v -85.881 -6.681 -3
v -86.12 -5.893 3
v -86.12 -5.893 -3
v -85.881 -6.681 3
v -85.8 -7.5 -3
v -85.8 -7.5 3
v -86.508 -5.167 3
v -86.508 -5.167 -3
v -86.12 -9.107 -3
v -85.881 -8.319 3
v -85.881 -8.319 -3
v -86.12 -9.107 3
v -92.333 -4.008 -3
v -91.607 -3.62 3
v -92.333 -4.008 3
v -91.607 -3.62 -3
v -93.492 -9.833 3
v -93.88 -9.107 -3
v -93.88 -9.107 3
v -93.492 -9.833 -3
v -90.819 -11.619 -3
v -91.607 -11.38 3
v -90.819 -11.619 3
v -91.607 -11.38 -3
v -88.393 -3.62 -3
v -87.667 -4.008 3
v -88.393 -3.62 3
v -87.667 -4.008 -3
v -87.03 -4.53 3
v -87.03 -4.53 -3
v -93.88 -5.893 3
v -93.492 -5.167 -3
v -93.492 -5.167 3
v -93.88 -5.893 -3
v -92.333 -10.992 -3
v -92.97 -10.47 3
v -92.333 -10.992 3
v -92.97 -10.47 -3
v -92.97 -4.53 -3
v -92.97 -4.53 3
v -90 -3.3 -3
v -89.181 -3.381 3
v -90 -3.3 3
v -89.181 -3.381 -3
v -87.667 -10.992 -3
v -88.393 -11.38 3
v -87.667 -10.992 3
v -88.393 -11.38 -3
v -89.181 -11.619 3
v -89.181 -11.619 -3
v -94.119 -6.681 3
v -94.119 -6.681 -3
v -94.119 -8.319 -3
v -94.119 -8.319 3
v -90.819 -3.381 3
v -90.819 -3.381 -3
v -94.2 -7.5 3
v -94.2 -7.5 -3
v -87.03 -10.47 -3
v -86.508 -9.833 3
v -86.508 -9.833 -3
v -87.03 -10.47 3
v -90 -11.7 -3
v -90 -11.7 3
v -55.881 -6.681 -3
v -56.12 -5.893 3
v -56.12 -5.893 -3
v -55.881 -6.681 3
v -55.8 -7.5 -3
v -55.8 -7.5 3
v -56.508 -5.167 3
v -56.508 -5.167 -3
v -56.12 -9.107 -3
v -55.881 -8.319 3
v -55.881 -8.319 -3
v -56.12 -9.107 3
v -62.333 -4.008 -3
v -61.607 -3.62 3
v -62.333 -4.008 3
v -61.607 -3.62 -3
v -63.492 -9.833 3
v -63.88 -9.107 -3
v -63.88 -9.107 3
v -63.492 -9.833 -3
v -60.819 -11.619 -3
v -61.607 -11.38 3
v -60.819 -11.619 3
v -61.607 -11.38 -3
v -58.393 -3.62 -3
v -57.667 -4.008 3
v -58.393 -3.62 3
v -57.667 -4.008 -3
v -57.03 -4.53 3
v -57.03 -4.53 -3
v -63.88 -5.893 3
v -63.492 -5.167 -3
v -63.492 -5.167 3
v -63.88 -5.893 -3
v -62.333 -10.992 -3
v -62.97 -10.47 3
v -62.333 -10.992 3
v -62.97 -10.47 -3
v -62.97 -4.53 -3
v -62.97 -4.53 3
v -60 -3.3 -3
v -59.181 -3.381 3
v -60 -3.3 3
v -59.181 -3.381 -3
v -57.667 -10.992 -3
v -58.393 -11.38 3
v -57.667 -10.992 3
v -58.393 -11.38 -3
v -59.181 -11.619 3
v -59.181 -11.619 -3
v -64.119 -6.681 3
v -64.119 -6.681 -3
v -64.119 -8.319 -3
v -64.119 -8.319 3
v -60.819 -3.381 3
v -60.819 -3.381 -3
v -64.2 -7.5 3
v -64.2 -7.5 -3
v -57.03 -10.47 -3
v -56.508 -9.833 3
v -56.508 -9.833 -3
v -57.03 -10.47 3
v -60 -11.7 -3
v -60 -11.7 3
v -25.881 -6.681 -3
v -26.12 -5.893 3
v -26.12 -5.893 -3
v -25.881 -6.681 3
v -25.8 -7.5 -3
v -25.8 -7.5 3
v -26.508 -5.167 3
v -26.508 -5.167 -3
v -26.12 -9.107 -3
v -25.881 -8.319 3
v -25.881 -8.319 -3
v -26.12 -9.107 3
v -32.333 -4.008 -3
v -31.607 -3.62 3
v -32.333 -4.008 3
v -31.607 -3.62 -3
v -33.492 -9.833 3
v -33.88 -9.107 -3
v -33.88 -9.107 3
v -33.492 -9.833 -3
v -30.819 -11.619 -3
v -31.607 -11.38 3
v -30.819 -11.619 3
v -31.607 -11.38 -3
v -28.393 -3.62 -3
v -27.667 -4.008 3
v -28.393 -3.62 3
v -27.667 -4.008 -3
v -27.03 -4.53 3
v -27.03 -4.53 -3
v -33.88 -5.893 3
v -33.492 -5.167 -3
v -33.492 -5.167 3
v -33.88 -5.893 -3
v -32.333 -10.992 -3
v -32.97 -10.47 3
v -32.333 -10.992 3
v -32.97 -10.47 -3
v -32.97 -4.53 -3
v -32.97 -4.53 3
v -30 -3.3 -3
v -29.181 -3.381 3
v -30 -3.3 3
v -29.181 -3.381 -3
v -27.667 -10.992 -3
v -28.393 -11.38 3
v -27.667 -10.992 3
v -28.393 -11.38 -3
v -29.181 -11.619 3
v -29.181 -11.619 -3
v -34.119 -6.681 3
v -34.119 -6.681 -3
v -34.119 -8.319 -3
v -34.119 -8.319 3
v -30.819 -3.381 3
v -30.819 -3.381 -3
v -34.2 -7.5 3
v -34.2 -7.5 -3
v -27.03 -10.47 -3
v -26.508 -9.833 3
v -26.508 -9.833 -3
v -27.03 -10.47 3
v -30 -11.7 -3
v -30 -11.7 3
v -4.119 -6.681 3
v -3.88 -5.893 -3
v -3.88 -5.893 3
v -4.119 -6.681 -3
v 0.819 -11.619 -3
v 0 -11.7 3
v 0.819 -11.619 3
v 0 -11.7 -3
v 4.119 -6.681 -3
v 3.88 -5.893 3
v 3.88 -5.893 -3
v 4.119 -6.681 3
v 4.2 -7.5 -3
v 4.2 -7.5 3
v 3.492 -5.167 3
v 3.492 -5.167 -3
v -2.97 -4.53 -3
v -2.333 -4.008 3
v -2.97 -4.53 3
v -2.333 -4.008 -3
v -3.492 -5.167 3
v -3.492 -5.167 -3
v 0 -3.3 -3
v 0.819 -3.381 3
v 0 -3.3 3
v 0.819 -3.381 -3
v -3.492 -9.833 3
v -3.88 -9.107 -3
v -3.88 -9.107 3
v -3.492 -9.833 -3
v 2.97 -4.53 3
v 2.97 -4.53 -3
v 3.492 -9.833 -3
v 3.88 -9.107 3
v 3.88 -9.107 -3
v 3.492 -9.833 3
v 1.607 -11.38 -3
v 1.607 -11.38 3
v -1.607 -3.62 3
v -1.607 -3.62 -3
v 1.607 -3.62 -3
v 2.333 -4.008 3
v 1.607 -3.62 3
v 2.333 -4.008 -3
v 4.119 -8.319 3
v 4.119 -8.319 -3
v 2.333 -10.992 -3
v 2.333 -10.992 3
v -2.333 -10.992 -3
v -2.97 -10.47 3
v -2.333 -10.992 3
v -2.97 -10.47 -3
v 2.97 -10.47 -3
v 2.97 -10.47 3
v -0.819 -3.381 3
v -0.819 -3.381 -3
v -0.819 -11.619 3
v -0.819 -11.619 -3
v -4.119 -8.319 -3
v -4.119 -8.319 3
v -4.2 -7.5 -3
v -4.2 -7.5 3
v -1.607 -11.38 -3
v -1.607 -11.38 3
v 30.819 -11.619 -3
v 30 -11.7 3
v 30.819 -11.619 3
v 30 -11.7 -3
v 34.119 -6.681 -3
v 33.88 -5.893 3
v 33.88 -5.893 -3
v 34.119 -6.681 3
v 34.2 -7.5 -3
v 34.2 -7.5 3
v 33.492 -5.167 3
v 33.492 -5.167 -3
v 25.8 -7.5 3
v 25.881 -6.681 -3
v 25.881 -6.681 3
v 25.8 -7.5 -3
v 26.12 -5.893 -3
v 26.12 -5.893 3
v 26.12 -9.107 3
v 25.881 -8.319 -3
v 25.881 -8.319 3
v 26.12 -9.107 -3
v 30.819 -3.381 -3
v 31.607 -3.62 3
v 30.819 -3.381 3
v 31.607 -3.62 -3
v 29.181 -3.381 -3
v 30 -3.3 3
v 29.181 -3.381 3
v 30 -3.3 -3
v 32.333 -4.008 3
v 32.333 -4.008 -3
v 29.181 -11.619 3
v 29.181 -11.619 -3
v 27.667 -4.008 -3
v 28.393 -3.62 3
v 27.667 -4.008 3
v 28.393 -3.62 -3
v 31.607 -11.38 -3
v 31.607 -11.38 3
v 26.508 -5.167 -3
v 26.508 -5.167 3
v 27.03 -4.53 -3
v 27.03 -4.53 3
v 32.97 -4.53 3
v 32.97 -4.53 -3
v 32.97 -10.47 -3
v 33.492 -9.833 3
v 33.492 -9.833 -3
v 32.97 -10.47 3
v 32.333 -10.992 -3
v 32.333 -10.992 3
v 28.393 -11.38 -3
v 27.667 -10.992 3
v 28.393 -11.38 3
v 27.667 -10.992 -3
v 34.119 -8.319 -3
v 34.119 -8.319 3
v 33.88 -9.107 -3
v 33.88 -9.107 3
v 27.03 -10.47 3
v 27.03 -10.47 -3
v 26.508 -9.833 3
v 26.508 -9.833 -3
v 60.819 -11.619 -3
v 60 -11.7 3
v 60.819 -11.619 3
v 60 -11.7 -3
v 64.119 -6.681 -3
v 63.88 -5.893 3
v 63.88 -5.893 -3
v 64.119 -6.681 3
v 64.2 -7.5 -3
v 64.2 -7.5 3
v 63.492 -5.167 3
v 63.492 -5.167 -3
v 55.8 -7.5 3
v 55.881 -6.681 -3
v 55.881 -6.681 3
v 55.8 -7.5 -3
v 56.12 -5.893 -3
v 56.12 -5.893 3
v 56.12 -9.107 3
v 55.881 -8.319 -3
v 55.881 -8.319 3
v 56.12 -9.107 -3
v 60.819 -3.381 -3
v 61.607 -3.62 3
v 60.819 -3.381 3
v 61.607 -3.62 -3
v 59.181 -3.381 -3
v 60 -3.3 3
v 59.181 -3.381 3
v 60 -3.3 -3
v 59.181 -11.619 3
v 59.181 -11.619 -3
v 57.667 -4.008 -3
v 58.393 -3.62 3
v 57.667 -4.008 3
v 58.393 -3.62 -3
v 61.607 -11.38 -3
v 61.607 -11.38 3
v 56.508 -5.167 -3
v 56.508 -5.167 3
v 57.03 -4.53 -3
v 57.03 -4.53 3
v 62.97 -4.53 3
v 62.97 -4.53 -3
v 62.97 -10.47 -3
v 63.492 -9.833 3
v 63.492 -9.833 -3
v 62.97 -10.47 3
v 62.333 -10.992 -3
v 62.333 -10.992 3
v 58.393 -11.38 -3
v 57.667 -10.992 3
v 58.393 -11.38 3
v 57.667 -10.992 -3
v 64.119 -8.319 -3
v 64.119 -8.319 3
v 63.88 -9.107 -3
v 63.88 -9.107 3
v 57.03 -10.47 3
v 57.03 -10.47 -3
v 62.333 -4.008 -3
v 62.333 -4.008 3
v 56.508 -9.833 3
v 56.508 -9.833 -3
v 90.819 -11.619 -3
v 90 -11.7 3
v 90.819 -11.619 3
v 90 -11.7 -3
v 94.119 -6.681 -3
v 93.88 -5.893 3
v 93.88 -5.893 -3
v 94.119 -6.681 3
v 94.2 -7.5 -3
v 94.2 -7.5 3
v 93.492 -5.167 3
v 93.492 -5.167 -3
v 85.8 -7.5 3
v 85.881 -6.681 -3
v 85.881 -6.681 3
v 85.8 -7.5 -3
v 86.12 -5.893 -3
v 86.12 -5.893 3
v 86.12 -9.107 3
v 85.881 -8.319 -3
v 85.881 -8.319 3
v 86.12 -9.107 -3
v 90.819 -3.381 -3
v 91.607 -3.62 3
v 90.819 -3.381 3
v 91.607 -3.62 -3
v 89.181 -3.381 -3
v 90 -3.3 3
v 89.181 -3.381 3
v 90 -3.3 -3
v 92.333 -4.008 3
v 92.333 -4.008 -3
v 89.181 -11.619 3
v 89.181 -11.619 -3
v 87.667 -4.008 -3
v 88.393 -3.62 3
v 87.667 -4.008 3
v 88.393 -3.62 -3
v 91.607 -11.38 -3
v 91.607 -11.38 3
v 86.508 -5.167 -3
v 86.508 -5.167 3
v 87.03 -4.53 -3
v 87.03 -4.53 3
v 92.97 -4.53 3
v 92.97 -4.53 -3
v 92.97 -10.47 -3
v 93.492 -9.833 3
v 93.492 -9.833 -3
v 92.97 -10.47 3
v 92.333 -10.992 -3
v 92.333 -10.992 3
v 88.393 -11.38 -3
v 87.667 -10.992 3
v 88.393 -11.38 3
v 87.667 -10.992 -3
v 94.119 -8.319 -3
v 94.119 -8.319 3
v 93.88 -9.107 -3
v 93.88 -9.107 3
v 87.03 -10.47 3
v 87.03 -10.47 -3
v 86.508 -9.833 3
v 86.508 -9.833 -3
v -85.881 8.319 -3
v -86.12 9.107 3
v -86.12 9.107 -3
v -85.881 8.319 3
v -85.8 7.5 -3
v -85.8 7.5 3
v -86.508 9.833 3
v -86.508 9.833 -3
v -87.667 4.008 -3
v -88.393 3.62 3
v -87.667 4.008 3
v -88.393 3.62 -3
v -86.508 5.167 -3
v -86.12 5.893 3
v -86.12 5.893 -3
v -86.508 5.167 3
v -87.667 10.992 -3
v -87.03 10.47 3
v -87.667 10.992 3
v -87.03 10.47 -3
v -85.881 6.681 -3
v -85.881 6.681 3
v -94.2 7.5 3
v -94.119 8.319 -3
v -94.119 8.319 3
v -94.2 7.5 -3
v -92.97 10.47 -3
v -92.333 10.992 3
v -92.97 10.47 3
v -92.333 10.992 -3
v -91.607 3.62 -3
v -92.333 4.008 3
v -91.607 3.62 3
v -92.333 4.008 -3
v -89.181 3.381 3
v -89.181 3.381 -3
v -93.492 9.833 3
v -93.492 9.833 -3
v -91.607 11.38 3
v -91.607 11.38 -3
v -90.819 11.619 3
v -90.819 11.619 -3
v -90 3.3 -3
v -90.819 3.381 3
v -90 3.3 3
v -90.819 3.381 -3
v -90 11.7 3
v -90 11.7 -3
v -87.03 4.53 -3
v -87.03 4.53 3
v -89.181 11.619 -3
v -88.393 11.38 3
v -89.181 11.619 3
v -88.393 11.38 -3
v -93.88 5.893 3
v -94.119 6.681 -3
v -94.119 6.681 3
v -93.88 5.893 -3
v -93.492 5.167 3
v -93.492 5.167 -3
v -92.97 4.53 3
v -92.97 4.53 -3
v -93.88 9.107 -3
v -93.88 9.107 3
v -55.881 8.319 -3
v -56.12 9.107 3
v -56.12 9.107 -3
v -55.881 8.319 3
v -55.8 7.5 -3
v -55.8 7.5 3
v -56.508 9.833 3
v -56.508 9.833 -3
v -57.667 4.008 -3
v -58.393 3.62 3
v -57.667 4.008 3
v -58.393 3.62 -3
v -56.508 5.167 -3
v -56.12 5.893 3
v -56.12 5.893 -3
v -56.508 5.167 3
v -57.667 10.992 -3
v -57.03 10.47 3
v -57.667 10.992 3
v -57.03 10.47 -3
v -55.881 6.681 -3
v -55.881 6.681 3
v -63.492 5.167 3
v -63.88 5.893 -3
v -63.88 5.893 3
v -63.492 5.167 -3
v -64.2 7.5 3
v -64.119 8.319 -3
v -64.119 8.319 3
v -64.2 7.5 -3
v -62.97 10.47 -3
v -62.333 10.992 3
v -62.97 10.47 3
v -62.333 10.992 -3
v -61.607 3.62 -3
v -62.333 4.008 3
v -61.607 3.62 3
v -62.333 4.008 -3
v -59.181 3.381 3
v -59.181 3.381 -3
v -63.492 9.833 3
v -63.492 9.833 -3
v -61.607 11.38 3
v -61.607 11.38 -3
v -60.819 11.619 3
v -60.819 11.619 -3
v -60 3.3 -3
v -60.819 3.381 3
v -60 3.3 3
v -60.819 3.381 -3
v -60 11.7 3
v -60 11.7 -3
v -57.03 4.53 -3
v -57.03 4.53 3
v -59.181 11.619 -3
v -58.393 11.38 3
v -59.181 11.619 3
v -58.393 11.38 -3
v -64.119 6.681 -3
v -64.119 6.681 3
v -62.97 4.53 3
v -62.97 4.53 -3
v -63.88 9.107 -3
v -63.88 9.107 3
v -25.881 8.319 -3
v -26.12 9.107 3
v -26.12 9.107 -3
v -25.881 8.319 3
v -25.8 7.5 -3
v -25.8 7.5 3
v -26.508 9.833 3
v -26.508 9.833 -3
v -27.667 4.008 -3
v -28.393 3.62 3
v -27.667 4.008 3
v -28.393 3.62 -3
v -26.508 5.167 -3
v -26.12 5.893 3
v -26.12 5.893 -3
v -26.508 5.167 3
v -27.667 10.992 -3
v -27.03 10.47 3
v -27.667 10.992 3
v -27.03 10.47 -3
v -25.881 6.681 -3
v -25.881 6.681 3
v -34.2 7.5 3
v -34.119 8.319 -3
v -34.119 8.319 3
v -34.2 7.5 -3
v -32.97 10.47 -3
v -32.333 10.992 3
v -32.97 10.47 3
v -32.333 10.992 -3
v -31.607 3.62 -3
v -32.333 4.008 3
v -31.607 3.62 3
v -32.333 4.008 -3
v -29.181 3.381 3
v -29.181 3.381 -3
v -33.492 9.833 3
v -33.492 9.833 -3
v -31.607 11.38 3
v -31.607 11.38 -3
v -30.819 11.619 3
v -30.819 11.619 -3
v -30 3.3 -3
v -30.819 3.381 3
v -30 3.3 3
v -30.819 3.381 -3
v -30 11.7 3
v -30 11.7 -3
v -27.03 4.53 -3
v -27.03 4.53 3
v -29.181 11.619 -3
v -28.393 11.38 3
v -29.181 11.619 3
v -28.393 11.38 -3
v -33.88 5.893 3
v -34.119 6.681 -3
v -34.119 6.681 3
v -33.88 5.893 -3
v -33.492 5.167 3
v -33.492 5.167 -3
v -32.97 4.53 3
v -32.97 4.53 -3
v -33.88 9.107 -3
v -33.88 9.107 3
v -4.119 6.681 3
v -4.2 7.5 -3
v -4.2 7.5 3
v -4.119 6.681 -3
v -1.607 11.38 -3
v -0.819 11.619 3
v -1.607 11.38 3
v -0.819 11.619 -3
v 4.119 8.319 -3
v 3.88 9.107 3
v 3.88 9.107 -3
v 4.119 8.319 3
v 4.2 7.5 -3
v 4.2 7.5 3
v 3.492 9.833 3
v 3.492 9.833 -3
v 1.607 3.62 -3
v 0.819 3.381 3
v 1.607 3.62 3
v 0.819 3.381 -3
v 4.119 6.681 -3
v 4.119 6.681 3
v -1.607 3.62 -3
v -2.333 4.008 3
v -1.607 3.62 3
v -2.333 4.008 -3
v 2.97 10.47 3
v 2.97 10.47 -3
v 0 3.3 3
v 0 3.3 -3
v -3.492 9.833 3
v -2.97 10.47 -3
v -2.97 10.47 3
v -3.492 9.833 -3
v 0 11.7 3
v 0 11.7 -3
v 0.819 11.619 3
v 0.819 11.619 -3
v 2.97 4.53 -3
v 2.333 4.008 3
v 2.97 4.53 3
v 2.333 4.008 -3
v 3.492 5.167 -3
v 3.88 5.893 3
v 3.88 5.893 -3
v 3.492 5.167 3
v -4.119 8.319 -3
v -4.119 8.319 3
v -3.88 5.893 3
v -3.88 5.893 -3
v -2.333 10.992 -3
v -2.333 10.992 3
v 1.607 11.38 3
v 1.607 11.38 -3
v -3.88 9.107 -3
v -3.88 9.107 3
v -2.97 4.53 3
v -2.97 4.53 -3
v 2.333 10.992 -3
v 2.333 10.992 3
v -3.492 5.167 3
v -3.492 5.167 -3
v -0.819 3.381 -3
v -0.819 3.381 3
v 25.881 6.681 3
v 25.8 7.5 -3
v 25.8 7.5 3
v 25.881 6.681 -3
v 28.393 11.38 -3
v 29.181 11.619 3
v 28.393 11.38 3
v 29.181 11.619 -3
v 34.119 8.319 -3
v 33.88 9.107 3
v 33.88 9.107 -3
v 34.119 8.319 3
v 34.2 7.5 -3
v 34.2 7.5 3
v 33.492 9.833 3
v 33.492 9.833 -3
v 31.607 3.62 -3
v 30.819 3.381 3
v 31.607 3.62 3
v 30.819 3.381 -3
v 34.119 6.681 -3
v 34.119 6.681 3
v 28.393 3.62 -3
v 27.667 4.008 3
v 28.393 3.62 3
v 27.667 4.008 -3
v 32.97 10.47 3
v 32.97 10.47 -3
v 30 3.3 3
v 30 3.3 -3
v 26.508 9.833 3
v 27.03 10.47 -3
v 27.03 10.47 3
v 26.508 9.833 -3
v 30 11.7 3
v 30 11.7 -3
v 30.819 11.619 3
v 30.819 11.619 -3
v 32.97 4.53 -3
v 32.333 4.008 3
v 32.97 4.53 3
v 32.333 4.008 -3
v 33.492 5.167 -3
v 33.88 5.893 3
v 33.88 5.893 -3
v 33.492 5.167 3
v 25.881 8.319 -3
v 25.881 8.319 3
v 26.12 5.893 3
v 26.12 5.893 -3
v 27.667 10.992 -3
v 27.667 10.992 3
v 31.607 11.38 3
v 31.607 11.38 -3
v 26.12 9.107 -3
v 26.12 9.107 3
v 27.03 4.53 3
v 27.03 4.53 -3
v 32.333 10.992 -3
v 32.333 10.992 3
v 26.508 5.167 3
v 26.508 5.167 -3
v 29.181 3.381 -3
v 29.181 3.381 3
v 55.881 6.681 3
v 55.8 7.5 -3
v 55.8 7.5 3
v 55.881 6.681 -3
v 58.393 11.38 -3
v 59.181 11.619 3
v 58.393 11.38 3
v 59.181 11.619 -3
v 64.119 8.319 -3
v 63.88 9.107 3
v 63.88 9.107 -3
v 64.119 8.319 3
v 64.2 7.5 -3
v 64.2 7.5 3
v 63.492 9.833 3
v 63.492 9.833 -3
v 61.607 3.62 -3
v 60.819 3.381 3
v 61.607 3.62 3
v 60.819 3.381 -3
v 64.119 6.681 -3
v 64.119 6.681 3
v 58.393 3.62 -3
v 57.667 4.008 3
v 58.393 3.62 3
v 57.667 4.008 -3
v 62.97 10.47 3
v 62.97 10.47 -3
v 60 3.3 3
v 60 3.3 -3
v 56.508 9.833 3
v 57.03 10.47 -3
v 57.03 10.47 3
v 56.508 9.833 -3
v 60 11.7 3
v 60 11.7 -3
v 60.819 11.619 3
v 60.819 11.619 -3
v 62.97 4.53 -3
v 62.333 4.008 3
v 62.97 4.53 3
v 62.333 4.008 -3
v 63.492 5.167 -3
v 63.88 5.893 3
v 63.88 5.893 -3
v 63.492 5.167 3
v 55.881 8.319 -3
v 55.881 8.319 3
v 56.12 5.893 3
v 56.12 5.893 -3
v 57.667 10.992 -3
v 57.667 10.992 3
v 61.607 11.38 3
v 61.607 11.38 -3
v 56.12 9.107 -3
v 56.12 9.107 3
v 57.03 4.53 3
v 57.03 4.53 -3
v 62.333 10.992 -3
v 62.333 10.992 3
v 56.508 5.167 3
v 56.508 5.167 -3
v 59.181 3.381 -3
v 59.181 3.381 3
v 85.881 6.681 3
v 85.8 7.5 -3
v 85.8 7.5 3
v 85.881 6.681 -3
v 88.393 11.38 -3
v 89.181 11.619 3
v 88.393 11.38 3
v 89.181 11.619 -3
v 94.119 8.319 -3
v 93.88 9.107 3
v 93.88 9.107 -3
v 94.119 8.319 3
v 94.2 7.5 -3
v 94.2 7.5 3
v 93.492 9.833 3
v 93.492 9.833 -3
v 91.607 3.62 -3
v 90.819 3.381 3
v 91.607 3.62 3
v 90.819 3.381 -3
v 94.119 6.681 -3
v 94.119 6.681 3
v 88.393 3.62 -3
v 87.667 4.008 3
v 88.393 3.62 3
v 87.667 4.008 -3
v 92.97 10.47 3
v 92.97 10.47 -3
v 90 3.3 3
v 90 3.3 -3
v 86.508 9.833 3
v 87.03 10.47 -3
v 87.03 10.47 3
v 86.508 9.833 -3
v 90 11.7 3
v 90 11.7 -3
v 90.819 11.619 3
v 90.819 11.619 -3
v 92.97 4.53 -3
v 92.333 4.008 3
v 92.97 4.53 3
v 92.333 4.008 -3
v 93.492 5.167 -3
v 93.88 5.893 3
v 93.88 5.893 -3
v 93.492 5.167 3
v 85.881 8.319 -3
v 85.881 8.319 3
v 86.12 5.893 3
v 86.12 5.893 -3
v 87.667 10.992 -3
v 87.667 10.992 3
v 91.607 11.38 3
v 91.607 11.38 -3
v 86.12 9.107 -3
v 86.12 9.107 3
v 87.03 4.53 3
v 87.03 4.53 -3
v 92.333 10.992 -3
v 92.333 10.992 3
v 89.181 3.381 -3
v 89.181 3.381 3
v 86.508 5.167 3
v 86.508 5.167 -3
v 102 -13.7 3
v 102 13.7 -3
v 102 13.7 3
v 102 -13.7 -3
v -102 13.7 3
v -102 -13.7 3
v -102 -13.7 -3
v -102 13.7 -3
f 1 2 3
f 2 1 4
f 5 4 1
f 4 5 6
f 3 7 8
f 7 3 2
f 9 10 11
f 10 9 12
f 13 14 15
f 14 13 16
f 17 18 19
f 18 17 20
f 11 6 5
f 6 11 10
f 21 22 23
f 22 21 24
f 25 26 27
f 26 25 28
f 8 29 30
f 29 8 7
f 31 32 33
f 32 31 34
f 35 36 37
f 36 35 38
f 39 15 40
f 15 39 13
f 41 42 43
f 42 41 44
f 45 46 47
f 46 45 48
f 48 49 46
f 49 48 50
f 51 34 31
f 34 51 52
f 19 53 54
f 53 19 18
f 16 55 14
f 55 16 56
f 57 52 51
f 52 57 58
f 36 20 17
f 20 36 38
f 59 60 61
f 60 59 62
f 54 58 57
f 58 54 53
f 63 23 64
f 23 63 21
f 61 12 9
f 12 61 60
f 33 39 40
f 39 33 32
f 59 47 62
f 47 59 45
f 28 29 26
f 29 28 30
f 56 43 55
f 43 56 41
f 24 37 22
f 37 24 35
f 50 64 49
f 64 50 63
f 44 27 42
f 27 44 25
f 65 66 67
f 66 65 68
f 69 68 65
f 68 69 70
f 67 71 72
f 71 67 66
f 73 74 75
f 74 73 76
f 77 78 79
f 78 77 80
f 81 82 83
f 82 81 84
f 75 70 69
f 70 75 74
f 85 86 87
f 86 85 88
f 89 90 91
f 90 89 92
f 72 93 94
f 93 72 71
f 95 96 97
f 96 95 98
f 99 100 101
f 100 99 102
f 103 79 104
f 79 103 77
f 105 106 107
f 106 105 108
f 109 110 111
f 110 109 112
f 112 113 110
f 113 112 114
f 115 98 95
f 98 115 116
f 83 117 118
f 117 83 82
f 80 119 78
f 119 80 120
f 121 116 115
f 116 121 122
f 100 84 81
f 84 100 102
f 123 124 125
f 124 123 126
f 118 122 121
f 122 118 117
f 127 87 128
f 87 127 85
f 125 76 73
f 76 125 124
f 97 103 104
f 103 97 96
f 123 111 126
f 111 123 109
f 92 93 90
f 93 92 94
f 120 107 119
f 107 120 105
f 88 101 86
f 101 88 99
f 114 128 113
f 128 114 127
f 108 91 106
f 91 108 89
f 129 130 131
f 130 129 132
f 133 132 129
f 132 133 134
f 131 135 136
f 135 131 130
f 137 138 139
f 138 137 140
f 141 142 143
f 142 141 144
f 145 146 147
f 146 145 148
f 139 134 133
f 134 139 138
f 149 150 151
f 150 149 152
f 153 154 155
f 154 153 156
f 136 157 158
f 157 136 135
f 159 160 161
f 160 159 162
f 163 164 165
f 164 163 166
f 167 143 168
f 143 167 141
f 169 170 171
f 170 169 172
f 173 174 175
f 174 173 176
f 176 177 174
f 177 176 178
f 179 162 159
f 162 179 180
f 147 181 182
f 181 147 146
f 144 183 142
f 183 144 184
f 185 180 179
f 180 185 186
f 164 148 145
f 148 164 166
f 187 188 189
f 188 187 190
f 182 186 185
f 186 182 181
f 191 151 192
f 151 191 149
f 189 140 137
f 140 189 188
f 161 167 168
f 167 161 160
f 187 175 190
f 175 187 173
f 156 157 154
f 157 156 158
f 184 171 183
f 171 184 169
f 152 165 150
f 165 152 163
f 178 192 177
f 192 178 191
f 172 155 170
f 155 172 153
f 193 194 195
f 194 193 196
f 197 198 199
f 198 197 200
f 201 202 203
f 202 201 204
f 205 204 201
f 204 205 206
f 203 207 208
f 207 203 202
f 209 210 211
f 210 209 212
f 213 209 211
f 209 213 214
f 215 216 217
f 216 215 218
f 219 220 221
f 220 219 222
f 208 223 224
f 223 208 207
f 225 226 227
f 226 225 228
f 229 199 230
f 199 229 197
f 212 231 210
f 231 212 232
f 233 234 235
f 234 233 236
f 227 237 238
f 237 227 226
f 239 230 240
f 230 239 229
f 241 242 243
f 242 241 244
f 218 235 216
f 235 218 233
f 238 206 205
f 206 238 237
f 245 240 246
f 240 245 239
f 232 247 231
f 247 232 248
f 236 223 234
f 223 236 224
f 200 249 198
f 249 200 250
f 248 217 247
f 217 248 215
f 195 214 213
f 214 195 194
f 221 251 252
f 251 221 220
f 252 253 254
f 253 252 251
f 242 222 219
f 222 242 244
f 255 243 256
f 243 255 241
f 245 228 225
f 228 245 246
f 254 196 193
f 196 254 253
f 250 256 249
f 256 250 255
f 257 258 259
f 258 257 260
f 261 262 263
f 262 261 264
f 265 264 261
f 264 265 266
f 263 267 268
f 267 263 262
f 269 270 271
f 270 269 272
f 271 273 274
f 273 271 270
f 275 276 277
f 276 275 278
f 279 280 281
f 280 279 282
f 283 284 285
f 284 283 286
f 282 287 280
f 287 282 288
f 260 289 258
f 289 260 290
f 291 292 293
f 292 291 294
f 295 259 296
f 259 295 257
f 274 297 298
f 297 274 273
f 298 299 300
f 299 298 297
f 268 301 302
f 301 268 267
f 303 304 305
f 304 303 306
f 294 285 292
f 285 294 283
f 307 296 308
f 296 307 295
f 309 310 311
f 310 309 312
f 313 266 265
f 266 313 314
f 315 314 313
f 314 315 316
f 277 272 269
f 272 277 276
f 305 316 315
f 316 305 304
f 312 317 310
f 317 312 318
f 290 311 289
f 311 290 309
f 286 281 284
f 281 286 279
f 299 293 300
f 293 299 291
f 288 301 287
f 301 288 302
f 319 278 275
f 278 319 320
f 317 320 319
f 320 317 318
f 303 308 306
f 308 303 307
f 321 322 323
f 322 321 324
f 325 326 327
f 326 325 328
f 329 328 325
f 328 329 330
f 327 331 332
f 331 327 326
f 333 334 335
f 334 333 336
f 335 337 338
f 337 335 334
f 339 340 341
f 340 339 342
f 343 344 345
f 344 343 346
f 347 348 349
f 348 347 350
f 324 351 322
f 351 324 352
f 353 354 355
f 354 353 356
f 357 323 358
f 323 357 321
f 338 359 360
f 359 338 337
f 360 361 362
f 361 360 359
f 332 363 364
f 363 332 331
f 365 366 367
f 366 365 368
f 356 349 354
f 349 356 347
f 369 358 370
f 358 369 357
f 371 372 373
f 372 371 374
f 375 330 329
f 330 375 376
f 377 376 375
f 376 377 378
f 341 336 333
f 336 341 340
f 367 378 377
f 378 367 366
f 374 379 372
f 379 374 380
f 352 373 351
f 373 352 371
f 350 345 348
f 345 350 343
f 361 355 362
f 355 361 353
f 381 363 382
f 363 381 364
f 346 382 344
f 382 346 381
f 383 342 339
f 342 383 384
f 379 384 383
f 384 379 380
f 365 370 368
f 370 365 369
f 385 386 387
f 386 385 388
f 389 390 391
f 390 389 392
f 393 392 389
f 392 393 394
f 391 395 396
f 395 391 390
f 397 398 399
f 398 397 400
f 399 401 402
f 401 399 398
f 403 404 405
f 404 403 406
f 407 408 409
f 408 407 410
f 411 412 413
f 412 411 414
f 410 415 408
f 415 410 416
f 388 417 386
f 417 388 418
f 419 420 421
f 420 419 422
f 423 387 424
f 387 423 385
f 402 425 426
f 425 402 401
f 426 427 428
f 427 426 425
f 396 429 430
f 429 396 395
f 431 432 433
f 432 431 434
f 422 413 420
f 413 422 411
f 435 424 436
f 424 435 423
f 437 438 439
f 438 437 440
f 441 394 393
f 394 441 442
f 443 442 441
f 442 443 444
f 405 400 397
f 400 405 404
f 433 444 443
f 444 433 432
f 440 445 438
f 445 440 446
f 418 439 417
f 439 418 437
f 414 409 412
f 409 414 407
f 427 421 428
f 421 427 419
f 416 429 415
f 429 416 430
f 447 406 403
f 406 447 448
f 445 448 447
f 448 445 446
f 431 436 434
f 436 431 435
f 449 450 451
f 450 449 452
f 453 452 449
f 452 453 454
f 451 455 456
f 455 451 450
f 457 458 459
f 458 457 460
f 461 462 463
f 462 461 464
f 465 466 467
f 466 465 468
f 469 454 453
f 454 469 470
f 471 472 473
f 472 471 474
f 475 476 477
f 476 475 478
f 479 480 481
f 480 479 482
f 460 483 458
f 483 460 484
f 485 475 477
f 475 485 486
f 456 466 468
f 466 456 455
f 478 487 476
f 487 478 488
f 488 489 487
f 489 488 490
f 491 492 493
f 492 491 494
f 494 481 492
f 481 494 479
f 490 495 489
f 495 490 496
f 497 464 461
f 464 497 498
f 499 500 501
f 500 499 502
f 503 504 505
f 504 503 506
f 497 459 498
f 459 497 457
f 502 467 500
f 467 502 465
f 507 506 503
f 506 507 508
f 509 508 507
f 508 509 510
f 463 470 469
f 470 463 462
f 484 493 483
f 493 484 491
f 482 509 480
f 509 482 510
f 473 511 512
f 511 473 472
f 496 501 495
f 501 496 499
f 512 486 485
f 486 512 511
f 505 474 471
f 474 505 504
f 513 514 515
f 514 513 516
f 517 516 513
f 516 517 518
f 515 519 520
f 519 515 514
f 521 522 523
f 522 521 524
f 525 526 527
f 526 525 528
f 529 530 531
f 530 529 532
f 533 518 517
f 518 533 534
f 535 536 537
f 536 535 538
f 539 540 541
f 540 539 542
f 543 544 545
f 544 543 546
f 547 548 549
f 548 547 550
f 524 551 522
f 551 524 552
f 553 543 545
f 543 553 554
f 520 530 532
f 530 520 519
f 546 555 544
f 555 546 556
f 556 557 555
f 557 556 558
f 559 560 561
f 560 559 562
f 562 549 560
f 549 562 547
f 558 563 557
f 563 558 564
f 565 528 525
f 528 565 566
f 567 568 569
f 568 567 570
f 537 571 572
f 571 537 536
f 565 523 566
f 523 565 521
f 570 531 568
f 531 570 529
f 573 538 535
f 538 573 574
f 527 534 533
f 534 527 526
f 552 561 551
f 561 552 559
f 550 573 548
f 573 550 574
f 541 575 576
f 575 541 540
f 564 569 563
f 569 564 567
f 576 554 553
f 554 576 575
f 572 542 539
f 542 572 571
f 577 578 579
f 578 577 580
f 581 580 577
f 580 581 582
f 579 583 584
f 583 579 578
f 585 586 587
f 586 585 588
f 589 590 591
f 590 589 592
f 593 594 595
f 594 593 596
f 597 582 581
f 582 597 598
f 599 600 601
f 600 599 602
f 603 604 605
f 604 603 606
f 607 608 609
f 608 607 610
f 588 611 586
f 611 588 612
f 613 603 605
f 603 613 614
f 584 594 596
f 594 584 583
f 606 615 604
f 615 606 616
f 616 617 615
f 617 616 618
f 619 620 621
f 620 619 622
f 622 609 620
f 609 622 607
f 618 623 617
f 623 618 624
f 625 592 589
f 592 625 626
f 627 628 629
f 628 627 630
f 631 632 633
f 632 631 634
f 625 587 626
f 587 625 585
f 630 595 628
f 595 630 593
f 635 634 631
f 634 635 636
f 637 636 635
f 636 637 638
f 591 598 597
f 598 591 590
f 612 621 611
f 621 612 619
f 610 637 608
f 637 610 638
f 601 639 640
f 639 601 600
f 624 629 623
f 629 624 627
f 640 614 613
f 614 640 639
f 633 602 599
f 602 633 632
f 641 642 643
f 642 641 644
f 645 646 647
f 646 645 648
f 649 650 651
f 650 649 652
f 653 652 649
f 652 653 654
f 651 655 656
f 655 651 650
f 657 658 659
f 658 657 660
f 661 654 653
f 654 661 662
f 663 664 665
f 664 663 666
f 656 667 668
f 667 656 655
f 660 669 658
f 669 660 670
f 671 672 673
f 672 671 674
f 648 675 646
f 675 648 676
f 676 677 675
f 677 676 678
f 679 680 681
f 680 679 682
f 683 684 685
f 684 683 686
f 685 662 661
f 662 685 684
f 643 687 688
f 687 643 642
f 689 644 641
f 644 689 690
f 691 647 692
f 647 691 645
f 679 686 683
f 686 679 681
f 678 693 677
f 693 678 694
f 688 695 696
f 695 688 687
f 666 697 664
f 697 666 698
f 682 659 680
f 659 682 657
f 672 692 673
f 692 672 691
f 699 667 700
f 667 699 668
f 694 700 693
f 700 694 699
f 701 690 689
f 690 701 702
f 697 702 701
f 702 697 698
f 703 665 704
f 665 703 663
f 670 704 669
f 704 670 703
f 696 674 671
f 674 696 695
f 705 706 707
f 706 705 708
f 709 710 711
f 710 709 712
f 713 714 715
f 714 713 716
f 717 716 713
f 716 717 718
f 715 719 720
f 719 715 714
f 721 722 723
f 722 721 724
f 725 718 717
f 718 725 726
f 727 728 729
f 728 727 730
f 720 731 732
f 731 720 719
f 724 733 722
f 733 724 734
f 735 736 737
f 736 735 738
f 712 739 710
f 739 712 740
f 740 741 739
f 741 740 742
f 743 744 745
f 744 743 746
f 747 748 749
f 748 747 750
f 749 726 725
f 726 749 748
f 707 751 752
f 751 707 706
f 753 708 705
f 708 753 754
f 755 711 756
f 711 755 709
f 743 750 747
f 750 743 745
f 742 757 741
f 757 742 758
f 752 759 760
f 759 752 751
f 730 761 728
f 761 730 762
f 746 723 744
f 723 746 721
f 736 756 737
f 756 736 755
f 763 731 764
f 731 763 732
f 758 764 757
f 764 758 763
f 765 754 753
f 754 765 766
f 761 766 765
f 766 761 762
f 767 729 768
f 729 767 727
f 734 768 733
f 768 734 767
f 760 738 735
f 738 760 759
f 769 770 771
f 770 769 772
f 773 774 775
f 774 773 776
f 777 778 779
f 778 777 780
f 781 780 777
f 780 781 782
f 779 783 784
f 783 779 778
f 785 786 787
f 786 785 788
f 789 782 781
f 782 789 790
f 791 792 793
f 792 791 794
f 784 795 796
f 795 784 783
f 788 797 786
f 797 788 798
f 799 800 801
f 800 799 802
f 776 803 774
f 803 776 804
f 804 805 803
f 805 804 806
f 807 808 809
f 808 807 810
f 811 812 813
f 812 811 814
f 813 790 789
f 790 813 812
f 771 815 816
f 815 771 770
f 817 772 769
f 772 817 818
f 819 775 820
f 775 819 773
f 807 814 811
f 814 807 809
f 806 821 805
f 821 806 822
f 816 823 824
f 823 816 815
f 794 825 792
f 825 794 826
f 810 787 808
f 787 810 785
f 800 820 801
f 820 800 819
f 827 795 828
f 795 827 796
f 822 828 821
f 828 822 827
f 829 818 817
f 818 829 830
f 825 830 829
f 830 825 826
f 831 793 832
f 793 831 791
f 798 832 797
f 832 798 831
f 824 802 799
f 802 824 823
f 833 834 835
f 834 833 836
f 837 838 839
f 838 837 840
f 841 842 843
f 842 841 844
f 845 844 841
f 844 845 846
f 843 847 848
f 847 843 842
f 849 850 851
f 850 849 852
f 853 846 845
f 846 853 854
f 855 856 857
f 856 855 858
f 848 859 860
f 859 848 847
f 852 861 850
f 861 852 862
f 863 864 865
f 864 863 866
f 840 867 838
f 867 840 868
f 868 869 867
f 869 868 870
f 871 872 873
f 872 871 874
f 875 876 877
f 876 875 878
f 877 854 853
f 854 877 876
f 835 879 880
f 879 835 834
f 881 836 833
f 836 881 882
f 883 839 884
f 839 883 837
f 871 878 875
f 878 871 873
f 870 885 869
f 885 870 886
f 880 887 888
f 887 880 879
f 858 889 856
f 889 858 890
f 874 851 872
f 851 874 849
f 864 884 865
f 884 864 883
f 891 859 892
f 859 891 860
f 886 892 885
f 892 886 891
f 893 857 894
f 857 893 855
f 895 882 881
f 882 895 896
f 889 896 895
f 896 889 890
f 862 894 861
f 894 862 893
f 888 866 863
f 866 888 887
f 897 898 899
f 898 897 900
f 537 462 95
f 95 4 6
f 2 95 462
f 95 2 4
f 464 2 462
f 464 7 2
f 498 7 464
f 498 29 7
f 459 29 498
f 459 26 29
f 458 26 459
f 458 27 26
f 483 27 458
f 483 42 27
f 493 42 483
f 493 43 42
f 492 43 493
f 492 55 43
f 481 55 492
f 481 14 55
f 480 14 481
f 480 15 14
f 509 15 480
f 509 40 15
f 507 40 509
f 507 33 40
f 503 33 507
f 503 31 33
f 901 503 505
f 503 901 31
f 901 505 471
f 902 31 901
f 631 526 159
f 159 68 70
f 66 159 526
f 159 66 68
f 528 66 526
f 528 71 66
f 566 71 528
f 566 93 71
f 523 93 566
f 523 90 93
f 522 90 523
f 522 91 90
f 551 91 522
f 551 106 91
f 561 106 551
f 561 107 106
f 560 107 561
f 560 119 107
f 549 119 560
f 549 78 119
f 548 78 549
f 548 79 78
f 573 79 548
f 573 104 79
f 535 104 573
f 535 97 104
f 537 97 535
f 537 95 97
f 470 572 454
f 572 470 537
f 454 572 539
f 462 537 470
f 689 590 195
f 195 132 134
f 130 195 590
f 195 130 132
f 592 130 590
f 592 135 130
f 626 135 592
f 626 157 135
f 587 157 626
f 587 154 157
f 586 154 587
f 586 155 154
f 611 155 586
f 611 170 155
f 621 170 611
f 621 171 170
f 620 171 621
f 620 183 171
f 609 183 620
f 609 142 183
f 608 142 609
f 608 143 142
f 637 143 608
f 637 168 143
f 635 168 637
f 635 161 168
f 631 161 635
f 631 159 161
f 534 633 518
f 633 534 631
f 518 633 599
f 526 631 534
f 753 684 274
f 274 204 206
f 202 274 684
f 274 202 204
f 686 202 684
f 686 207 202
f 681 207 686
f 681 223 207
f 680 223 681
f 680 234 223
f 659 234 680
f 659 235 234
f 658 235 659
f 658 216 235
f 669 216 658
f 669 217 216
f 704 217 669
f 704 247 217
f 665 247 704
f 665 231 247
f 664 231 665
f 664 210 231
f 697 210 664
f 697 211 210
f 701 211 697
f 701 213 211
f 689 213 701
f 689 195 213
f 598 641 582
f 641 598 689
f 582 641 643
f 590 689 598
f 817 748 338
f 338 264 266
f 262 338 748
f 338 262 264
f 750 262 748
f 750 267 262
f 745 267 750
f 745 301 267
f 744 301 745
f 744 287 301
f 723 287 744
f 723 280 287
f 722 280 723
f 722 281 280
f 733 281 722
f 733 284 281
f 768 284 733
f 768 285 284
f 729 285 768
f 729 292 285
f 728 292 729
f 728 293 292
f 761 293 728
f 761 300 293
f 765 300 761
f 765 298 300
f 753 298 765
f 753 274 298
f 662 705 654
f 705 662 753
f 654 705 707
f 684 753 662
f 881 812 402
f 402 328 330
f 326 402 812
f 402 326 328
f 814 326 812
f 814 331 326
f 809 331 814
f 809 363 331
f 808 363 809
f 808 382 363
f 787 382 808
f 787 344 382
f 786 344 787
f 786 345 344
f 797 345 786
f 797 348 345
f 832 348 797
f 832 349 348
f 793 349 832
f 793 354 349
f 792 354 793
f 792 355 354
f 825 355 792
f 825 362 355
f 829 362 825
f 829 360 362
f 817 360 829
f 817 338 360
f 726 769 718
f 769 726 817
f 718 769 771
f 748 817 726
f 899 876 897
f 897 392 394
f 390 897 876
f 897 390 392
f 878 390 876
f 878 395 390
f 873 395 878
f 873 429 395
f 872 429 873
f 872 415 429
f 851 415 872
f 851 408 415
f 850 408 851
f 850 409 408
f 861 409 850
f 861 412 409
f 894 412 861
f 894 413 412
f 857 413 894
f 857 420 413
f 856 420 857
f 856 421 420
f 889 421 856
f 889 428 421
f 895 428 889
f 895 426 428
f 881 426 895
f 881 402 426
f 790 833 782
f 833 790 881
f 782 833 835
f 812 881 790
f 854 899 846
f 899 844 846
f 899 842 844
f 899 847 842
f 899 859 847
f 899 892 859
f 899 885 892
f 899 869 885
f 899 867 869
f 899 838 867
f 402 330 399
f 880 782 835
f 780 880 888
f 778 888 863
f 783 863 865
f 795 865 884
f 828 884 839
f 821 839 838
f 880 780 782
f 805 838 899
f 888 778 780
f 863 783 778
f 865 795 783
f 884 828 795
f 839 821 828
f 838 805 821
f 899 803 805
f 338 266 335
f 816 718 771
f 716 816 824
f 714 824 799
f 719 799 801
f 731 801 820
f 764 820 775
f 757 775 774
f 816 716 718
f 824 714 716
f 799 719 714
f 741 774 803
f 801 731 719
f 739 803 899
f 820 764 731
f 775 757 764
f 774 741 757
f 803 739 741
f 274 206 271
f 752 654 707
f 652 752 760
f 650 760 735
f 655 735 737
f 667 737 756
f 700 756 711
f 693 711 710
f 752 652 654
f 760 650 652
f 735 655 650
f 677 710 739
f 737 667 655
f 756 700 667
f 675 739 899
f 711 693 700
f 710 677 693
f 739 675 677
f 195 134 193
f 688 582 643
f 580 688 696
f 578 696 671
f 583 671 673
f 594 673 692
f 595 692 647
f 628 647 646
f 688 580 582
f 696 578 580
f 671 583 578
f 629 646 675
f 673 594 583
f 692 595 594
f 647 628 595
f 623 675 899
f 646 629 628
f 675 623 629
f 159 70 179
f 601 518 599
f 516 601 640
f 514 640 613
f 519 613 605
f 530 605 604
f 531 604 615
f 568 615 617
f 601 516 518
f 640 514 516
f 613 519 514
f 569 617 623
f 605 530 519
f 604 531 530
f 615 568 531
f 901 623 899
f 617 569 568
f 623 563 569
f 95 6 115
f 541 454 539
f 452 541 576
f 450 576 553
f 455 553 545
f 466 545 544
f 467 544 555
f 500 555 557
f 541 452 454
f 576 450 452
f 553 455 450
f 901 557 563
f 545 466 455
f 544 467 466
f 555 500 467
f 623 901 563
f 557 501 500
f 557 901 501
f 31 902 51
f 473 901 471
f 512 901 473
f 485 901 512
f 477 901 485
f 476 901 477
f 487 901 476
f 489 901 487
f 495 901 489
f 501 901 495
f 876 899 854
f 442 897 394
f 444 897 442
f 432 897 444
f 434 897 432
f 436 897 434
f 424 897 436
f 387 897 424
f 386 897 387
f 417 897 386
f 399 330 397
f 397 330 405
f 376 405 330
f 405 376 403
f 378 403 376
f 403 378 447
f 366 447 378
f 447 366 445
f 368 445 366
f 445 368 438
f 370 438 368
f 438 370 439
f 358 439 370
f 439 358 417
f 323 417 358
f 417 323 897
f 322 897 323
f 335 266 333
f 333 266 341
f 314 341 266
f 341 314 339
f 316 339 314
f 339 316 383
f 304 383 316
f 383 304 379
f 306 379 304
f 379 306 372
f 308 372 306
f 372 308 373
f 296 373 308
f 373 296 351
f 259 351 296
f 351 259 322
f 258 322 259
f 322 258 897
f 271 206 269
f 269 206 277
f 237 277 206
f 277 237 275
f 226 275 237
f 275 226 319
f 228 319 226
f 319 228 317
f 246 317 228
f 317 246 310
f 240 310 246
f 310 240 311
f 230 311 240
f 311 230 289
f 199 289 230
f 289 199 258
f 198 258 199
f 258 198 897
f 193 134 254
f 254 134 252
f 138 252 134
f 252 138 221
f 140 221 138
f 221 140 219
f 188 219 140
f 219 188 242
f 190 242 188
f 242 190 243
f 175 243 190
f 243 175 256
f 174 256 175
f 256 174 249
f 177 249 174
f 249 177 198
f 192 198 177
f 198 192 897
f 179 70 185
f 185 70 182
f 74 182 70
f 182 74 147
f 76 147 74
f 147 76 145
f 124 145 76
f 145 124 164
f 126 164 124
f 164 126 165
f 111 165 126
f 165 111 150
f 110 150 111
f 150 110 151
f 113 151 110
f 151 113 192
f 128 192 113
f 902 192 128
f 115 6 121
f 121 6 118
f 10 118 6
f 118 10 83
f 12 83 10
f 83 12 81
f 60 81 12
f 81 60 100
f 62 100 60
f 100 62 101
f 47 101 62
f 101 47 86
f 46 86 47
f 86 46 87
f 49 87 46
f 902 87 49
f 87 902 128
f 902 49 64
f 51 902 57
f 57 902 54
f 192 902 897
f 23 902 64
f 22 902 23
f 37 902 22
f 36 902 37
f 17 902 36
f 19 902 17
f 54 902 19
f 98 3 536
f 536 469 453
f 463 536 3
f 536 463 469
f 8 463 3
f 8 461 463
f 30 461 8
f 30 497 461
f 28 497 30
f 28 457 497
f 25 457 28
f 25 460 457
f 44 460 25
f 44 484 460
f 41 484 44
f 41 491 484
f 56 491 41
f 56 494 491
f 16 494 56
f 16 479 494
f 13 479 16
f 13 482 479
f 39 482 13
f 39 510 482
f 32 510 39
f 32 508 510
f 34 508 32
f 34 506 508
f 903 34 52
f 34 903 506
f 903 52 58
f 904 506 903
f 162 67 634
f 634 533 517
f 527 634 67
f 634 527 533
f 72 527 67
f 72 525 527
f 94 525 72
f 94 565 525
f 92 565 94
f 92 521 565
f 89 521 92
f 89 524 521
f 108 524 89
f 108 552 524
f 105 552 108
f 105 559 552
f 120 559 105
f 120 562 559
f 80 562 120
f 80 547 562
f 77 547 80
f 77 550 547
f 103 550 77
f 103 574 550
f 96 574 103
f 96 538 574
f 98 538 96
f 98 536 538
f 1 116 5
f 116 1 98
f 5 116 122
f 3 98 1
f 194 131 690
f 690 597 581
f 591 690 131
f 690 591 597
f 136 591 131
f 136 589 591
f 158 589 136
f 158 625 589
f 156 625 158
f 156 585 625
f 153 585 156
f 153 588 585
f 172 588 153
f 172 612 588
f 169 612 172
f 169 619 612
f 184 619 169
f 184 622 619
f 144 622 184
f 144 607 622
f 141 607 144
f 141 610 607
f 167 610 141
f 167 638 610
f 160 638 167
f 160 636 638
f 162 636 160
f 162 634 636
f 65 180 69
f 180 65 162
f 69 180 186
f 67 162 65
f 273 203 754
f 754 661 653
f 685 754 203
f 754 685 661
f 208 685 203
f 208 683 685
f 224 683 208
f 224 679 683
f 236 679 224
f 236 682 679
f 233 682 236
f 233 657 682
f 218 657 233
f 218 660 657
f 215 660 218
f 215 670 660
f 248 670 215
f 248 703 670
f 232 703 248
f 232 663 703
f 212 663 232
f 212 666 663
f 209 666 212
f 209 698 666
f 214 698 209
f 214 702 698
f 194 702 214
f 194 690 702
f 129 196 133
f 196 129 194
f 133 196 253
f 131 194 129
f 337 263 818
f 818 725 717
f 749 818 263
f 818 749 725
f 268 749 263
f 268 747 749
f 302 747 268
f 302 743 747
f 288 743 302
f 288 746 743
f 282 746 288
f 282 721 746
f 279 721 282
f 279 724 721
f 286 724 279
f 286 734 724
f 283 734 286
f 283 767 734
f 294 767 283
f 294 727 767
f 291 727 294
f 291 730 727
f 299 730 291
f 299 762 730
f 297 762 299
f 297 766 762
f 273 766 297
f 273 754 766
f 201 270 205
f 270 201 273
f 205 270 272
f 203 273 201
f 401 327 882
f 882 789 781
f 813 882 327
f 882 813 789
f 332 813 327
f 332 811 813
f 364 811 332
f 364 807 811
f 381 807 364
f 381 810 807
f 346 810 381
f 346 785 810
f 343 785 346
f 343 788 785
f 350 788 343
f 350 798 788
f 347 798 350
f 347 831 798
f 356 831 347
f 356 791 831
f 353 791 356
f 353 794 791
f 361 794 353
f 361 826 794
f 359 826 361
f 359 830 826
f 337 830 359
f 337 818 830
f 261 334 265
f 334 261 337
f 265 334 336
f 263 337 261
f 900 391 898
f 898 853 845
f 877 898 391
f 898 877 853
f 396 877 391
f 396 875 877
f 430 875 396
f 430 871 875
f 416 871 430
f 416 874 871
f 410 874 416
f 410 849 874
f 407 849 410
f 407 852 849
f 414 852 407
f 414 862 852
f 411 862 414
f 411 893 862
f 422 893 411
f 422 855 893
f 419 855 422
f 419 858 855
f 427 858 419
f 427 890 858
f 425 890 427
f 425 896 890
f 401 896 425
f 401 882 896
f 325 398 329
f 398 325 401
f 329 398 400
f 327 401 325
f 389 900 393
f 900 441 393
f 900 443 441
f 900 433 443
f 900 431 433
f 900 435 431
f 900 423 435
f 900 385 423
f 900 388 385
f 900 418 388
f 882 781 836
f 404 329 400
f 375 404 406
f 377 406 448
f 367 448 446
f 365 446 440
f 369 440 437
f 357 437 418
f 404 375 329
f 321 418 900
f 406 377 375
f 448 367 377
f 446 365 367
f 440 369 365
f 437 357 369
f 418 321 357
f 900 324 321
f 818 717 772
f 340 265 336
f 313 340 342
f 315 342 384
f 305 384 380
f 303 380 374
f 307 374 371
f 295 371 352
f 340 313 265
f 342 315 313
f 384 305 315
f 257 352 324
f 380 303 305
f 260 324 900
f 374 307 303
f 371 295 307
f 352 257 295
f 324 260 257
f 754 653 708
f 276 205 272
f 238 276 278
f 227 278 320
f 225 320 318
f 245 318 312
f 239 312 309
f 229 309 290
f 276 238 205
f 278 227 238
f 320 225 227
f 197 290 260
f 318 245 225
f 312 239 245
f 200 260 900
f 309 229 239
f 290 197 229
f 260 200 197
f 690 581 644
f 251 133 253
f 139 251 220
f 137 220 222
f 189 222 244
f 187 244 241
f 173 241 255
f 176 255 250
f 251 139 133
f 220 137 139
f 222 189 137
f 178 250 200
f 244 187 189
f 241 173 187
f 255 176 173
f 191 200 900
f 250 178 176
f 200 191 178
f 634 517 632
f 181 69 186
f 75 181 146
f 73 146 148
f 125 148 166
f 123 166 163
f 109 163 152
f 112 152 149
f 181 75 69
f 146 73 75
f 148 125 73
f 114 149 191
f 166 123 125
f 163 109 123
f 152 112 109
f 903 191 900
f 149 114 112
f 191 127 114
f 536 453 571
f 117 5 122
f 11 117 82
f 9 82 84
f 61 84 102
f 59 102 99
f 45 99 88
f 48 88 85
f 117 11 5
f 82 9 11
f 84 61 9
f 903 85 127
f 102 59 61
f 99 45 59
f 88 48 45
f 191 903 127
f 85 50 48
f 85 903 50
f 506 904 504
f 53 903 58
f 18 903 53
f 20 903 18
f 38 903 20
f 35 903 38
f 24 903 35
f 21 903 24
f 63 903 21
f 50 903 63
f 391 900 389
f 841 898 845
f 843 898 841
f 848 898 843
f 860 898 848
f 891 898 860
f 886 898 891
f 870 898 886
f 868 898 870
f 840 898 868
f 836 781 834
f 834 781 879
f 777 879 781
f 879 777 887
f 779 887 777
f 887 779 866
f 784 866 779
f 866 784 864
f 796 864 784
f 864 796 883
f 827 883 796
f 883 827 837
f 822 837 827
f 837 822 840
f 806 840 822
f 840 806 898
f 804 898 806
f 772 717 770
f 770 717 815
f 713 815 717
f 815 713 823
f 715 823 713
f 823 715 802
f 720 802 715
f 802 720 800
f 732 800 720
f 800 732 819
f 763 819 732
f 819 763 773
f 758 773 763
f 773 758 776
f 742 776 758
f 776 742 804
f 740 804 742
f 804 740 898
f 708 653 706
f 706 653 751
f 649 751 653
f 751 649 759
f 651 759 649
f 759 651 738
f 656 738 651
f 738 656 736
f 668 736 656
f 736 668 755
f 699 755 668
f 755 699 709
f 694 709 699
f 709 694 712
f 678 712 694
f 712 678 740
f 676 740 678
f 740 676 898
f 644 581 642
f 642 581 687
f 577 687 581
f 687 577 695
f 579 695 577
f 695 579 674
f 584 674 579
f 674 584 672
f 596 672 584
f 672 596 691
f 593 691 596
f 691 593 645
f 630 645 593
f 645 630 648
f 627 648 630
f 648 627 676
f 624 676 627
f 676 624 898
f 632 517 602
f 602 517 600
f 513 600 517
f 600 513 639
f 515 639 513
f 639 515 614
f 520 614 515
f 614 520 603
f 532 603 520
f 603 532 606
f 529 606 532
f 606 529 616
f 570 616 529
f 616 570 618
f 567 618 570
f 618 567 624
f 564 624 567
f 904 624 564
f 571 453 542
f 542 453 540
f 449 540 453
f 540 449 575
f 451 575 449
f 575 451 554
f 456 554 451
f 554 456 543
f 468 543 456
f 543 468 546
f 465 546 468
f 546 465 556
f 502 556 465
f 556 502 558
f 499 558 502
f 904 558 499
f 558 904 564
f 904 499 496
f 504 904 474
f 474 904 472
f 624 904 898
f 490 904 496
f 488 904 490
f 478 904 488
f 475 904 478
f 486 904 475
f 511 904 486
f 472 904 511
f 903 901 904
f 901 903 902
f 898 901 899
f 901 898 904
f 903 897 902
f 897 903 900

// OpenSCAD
$fn = 32;

// ----------------------------------------------------------------------
// Hole bar, 7 x Ø8.4
// tworows layout, 12 mm edge offset
// ----------------------------------------------------------------------

// --- parameters (mm) ---
bar_w = 27.4;     // bar width (Y)
bar_t = 6;        // bar thickness (Z)
holes = 7;        // holes per row
hole_d = 8.4;     // hole diameter
edge = 12;        // offset from the bar end to the first hole
pitch = 30;       // pitch between neighbouring holes
row_offset = 15;  // distance between the two rows

// --- derived feature positions (mm) ---
span = (holes - 1) * pitch;   // = 180   distance between the end holes
bar_l = span + 2 * edge;      // = 204   overall bar length
start_x = -bar_l / 2 + edge;  // = -90   X of the first hole
feature_centers = [
  [start_x + 0 * pitch, -row_offset / 2],
  [start_x + 1 * pitch, -row_offset / 2],
  [start_x + 2 * pitch, -row_offset / 2],
  [start_x + 3 * pitch, -row_offset / 2],
  [start_x + 4 * pitch, -row_offset / 2],
  [start_x + 5 * pitch, -row_offset / 2],
  [start_x + 6 * pitch, -row_offset / 2]
];   // hole centres of the first row
row2_centers = [
  [start_x + 0 * pitch, row_offset / 2],
  [start_x + 1 * pitch, row_offset / 2],
  [start_x + 2 * pitch, row_offset / 2],
  [start_x + 3 * pitch, row_offset / 2],
  [start_x + 4 * pitch, row_offset / 2],
  [start_x + 5 * pitch, row_offset / 2],
  [start_x + 6 * pitch, row_offset / 2]
];   // hole centres of the second row

// bar with two rows of holes, both read from their own centre arrays
difference() {
  translate([-bar_l / 2, -bar_w / 2, -bar_t / 2]) cube([bar_l, bar_w, bar_t]);
  for (centre = feature_centers)
    translate([centre[0], centre[1], 0])
      cylinder(d = hole_d, h = bar_t + 2, center = true);
  for (centre = row2_centers)
    translate([centre[0], centre[1], 0])
      cylinder(d = hole_d, h = bar_t + 2, center = true);
}
